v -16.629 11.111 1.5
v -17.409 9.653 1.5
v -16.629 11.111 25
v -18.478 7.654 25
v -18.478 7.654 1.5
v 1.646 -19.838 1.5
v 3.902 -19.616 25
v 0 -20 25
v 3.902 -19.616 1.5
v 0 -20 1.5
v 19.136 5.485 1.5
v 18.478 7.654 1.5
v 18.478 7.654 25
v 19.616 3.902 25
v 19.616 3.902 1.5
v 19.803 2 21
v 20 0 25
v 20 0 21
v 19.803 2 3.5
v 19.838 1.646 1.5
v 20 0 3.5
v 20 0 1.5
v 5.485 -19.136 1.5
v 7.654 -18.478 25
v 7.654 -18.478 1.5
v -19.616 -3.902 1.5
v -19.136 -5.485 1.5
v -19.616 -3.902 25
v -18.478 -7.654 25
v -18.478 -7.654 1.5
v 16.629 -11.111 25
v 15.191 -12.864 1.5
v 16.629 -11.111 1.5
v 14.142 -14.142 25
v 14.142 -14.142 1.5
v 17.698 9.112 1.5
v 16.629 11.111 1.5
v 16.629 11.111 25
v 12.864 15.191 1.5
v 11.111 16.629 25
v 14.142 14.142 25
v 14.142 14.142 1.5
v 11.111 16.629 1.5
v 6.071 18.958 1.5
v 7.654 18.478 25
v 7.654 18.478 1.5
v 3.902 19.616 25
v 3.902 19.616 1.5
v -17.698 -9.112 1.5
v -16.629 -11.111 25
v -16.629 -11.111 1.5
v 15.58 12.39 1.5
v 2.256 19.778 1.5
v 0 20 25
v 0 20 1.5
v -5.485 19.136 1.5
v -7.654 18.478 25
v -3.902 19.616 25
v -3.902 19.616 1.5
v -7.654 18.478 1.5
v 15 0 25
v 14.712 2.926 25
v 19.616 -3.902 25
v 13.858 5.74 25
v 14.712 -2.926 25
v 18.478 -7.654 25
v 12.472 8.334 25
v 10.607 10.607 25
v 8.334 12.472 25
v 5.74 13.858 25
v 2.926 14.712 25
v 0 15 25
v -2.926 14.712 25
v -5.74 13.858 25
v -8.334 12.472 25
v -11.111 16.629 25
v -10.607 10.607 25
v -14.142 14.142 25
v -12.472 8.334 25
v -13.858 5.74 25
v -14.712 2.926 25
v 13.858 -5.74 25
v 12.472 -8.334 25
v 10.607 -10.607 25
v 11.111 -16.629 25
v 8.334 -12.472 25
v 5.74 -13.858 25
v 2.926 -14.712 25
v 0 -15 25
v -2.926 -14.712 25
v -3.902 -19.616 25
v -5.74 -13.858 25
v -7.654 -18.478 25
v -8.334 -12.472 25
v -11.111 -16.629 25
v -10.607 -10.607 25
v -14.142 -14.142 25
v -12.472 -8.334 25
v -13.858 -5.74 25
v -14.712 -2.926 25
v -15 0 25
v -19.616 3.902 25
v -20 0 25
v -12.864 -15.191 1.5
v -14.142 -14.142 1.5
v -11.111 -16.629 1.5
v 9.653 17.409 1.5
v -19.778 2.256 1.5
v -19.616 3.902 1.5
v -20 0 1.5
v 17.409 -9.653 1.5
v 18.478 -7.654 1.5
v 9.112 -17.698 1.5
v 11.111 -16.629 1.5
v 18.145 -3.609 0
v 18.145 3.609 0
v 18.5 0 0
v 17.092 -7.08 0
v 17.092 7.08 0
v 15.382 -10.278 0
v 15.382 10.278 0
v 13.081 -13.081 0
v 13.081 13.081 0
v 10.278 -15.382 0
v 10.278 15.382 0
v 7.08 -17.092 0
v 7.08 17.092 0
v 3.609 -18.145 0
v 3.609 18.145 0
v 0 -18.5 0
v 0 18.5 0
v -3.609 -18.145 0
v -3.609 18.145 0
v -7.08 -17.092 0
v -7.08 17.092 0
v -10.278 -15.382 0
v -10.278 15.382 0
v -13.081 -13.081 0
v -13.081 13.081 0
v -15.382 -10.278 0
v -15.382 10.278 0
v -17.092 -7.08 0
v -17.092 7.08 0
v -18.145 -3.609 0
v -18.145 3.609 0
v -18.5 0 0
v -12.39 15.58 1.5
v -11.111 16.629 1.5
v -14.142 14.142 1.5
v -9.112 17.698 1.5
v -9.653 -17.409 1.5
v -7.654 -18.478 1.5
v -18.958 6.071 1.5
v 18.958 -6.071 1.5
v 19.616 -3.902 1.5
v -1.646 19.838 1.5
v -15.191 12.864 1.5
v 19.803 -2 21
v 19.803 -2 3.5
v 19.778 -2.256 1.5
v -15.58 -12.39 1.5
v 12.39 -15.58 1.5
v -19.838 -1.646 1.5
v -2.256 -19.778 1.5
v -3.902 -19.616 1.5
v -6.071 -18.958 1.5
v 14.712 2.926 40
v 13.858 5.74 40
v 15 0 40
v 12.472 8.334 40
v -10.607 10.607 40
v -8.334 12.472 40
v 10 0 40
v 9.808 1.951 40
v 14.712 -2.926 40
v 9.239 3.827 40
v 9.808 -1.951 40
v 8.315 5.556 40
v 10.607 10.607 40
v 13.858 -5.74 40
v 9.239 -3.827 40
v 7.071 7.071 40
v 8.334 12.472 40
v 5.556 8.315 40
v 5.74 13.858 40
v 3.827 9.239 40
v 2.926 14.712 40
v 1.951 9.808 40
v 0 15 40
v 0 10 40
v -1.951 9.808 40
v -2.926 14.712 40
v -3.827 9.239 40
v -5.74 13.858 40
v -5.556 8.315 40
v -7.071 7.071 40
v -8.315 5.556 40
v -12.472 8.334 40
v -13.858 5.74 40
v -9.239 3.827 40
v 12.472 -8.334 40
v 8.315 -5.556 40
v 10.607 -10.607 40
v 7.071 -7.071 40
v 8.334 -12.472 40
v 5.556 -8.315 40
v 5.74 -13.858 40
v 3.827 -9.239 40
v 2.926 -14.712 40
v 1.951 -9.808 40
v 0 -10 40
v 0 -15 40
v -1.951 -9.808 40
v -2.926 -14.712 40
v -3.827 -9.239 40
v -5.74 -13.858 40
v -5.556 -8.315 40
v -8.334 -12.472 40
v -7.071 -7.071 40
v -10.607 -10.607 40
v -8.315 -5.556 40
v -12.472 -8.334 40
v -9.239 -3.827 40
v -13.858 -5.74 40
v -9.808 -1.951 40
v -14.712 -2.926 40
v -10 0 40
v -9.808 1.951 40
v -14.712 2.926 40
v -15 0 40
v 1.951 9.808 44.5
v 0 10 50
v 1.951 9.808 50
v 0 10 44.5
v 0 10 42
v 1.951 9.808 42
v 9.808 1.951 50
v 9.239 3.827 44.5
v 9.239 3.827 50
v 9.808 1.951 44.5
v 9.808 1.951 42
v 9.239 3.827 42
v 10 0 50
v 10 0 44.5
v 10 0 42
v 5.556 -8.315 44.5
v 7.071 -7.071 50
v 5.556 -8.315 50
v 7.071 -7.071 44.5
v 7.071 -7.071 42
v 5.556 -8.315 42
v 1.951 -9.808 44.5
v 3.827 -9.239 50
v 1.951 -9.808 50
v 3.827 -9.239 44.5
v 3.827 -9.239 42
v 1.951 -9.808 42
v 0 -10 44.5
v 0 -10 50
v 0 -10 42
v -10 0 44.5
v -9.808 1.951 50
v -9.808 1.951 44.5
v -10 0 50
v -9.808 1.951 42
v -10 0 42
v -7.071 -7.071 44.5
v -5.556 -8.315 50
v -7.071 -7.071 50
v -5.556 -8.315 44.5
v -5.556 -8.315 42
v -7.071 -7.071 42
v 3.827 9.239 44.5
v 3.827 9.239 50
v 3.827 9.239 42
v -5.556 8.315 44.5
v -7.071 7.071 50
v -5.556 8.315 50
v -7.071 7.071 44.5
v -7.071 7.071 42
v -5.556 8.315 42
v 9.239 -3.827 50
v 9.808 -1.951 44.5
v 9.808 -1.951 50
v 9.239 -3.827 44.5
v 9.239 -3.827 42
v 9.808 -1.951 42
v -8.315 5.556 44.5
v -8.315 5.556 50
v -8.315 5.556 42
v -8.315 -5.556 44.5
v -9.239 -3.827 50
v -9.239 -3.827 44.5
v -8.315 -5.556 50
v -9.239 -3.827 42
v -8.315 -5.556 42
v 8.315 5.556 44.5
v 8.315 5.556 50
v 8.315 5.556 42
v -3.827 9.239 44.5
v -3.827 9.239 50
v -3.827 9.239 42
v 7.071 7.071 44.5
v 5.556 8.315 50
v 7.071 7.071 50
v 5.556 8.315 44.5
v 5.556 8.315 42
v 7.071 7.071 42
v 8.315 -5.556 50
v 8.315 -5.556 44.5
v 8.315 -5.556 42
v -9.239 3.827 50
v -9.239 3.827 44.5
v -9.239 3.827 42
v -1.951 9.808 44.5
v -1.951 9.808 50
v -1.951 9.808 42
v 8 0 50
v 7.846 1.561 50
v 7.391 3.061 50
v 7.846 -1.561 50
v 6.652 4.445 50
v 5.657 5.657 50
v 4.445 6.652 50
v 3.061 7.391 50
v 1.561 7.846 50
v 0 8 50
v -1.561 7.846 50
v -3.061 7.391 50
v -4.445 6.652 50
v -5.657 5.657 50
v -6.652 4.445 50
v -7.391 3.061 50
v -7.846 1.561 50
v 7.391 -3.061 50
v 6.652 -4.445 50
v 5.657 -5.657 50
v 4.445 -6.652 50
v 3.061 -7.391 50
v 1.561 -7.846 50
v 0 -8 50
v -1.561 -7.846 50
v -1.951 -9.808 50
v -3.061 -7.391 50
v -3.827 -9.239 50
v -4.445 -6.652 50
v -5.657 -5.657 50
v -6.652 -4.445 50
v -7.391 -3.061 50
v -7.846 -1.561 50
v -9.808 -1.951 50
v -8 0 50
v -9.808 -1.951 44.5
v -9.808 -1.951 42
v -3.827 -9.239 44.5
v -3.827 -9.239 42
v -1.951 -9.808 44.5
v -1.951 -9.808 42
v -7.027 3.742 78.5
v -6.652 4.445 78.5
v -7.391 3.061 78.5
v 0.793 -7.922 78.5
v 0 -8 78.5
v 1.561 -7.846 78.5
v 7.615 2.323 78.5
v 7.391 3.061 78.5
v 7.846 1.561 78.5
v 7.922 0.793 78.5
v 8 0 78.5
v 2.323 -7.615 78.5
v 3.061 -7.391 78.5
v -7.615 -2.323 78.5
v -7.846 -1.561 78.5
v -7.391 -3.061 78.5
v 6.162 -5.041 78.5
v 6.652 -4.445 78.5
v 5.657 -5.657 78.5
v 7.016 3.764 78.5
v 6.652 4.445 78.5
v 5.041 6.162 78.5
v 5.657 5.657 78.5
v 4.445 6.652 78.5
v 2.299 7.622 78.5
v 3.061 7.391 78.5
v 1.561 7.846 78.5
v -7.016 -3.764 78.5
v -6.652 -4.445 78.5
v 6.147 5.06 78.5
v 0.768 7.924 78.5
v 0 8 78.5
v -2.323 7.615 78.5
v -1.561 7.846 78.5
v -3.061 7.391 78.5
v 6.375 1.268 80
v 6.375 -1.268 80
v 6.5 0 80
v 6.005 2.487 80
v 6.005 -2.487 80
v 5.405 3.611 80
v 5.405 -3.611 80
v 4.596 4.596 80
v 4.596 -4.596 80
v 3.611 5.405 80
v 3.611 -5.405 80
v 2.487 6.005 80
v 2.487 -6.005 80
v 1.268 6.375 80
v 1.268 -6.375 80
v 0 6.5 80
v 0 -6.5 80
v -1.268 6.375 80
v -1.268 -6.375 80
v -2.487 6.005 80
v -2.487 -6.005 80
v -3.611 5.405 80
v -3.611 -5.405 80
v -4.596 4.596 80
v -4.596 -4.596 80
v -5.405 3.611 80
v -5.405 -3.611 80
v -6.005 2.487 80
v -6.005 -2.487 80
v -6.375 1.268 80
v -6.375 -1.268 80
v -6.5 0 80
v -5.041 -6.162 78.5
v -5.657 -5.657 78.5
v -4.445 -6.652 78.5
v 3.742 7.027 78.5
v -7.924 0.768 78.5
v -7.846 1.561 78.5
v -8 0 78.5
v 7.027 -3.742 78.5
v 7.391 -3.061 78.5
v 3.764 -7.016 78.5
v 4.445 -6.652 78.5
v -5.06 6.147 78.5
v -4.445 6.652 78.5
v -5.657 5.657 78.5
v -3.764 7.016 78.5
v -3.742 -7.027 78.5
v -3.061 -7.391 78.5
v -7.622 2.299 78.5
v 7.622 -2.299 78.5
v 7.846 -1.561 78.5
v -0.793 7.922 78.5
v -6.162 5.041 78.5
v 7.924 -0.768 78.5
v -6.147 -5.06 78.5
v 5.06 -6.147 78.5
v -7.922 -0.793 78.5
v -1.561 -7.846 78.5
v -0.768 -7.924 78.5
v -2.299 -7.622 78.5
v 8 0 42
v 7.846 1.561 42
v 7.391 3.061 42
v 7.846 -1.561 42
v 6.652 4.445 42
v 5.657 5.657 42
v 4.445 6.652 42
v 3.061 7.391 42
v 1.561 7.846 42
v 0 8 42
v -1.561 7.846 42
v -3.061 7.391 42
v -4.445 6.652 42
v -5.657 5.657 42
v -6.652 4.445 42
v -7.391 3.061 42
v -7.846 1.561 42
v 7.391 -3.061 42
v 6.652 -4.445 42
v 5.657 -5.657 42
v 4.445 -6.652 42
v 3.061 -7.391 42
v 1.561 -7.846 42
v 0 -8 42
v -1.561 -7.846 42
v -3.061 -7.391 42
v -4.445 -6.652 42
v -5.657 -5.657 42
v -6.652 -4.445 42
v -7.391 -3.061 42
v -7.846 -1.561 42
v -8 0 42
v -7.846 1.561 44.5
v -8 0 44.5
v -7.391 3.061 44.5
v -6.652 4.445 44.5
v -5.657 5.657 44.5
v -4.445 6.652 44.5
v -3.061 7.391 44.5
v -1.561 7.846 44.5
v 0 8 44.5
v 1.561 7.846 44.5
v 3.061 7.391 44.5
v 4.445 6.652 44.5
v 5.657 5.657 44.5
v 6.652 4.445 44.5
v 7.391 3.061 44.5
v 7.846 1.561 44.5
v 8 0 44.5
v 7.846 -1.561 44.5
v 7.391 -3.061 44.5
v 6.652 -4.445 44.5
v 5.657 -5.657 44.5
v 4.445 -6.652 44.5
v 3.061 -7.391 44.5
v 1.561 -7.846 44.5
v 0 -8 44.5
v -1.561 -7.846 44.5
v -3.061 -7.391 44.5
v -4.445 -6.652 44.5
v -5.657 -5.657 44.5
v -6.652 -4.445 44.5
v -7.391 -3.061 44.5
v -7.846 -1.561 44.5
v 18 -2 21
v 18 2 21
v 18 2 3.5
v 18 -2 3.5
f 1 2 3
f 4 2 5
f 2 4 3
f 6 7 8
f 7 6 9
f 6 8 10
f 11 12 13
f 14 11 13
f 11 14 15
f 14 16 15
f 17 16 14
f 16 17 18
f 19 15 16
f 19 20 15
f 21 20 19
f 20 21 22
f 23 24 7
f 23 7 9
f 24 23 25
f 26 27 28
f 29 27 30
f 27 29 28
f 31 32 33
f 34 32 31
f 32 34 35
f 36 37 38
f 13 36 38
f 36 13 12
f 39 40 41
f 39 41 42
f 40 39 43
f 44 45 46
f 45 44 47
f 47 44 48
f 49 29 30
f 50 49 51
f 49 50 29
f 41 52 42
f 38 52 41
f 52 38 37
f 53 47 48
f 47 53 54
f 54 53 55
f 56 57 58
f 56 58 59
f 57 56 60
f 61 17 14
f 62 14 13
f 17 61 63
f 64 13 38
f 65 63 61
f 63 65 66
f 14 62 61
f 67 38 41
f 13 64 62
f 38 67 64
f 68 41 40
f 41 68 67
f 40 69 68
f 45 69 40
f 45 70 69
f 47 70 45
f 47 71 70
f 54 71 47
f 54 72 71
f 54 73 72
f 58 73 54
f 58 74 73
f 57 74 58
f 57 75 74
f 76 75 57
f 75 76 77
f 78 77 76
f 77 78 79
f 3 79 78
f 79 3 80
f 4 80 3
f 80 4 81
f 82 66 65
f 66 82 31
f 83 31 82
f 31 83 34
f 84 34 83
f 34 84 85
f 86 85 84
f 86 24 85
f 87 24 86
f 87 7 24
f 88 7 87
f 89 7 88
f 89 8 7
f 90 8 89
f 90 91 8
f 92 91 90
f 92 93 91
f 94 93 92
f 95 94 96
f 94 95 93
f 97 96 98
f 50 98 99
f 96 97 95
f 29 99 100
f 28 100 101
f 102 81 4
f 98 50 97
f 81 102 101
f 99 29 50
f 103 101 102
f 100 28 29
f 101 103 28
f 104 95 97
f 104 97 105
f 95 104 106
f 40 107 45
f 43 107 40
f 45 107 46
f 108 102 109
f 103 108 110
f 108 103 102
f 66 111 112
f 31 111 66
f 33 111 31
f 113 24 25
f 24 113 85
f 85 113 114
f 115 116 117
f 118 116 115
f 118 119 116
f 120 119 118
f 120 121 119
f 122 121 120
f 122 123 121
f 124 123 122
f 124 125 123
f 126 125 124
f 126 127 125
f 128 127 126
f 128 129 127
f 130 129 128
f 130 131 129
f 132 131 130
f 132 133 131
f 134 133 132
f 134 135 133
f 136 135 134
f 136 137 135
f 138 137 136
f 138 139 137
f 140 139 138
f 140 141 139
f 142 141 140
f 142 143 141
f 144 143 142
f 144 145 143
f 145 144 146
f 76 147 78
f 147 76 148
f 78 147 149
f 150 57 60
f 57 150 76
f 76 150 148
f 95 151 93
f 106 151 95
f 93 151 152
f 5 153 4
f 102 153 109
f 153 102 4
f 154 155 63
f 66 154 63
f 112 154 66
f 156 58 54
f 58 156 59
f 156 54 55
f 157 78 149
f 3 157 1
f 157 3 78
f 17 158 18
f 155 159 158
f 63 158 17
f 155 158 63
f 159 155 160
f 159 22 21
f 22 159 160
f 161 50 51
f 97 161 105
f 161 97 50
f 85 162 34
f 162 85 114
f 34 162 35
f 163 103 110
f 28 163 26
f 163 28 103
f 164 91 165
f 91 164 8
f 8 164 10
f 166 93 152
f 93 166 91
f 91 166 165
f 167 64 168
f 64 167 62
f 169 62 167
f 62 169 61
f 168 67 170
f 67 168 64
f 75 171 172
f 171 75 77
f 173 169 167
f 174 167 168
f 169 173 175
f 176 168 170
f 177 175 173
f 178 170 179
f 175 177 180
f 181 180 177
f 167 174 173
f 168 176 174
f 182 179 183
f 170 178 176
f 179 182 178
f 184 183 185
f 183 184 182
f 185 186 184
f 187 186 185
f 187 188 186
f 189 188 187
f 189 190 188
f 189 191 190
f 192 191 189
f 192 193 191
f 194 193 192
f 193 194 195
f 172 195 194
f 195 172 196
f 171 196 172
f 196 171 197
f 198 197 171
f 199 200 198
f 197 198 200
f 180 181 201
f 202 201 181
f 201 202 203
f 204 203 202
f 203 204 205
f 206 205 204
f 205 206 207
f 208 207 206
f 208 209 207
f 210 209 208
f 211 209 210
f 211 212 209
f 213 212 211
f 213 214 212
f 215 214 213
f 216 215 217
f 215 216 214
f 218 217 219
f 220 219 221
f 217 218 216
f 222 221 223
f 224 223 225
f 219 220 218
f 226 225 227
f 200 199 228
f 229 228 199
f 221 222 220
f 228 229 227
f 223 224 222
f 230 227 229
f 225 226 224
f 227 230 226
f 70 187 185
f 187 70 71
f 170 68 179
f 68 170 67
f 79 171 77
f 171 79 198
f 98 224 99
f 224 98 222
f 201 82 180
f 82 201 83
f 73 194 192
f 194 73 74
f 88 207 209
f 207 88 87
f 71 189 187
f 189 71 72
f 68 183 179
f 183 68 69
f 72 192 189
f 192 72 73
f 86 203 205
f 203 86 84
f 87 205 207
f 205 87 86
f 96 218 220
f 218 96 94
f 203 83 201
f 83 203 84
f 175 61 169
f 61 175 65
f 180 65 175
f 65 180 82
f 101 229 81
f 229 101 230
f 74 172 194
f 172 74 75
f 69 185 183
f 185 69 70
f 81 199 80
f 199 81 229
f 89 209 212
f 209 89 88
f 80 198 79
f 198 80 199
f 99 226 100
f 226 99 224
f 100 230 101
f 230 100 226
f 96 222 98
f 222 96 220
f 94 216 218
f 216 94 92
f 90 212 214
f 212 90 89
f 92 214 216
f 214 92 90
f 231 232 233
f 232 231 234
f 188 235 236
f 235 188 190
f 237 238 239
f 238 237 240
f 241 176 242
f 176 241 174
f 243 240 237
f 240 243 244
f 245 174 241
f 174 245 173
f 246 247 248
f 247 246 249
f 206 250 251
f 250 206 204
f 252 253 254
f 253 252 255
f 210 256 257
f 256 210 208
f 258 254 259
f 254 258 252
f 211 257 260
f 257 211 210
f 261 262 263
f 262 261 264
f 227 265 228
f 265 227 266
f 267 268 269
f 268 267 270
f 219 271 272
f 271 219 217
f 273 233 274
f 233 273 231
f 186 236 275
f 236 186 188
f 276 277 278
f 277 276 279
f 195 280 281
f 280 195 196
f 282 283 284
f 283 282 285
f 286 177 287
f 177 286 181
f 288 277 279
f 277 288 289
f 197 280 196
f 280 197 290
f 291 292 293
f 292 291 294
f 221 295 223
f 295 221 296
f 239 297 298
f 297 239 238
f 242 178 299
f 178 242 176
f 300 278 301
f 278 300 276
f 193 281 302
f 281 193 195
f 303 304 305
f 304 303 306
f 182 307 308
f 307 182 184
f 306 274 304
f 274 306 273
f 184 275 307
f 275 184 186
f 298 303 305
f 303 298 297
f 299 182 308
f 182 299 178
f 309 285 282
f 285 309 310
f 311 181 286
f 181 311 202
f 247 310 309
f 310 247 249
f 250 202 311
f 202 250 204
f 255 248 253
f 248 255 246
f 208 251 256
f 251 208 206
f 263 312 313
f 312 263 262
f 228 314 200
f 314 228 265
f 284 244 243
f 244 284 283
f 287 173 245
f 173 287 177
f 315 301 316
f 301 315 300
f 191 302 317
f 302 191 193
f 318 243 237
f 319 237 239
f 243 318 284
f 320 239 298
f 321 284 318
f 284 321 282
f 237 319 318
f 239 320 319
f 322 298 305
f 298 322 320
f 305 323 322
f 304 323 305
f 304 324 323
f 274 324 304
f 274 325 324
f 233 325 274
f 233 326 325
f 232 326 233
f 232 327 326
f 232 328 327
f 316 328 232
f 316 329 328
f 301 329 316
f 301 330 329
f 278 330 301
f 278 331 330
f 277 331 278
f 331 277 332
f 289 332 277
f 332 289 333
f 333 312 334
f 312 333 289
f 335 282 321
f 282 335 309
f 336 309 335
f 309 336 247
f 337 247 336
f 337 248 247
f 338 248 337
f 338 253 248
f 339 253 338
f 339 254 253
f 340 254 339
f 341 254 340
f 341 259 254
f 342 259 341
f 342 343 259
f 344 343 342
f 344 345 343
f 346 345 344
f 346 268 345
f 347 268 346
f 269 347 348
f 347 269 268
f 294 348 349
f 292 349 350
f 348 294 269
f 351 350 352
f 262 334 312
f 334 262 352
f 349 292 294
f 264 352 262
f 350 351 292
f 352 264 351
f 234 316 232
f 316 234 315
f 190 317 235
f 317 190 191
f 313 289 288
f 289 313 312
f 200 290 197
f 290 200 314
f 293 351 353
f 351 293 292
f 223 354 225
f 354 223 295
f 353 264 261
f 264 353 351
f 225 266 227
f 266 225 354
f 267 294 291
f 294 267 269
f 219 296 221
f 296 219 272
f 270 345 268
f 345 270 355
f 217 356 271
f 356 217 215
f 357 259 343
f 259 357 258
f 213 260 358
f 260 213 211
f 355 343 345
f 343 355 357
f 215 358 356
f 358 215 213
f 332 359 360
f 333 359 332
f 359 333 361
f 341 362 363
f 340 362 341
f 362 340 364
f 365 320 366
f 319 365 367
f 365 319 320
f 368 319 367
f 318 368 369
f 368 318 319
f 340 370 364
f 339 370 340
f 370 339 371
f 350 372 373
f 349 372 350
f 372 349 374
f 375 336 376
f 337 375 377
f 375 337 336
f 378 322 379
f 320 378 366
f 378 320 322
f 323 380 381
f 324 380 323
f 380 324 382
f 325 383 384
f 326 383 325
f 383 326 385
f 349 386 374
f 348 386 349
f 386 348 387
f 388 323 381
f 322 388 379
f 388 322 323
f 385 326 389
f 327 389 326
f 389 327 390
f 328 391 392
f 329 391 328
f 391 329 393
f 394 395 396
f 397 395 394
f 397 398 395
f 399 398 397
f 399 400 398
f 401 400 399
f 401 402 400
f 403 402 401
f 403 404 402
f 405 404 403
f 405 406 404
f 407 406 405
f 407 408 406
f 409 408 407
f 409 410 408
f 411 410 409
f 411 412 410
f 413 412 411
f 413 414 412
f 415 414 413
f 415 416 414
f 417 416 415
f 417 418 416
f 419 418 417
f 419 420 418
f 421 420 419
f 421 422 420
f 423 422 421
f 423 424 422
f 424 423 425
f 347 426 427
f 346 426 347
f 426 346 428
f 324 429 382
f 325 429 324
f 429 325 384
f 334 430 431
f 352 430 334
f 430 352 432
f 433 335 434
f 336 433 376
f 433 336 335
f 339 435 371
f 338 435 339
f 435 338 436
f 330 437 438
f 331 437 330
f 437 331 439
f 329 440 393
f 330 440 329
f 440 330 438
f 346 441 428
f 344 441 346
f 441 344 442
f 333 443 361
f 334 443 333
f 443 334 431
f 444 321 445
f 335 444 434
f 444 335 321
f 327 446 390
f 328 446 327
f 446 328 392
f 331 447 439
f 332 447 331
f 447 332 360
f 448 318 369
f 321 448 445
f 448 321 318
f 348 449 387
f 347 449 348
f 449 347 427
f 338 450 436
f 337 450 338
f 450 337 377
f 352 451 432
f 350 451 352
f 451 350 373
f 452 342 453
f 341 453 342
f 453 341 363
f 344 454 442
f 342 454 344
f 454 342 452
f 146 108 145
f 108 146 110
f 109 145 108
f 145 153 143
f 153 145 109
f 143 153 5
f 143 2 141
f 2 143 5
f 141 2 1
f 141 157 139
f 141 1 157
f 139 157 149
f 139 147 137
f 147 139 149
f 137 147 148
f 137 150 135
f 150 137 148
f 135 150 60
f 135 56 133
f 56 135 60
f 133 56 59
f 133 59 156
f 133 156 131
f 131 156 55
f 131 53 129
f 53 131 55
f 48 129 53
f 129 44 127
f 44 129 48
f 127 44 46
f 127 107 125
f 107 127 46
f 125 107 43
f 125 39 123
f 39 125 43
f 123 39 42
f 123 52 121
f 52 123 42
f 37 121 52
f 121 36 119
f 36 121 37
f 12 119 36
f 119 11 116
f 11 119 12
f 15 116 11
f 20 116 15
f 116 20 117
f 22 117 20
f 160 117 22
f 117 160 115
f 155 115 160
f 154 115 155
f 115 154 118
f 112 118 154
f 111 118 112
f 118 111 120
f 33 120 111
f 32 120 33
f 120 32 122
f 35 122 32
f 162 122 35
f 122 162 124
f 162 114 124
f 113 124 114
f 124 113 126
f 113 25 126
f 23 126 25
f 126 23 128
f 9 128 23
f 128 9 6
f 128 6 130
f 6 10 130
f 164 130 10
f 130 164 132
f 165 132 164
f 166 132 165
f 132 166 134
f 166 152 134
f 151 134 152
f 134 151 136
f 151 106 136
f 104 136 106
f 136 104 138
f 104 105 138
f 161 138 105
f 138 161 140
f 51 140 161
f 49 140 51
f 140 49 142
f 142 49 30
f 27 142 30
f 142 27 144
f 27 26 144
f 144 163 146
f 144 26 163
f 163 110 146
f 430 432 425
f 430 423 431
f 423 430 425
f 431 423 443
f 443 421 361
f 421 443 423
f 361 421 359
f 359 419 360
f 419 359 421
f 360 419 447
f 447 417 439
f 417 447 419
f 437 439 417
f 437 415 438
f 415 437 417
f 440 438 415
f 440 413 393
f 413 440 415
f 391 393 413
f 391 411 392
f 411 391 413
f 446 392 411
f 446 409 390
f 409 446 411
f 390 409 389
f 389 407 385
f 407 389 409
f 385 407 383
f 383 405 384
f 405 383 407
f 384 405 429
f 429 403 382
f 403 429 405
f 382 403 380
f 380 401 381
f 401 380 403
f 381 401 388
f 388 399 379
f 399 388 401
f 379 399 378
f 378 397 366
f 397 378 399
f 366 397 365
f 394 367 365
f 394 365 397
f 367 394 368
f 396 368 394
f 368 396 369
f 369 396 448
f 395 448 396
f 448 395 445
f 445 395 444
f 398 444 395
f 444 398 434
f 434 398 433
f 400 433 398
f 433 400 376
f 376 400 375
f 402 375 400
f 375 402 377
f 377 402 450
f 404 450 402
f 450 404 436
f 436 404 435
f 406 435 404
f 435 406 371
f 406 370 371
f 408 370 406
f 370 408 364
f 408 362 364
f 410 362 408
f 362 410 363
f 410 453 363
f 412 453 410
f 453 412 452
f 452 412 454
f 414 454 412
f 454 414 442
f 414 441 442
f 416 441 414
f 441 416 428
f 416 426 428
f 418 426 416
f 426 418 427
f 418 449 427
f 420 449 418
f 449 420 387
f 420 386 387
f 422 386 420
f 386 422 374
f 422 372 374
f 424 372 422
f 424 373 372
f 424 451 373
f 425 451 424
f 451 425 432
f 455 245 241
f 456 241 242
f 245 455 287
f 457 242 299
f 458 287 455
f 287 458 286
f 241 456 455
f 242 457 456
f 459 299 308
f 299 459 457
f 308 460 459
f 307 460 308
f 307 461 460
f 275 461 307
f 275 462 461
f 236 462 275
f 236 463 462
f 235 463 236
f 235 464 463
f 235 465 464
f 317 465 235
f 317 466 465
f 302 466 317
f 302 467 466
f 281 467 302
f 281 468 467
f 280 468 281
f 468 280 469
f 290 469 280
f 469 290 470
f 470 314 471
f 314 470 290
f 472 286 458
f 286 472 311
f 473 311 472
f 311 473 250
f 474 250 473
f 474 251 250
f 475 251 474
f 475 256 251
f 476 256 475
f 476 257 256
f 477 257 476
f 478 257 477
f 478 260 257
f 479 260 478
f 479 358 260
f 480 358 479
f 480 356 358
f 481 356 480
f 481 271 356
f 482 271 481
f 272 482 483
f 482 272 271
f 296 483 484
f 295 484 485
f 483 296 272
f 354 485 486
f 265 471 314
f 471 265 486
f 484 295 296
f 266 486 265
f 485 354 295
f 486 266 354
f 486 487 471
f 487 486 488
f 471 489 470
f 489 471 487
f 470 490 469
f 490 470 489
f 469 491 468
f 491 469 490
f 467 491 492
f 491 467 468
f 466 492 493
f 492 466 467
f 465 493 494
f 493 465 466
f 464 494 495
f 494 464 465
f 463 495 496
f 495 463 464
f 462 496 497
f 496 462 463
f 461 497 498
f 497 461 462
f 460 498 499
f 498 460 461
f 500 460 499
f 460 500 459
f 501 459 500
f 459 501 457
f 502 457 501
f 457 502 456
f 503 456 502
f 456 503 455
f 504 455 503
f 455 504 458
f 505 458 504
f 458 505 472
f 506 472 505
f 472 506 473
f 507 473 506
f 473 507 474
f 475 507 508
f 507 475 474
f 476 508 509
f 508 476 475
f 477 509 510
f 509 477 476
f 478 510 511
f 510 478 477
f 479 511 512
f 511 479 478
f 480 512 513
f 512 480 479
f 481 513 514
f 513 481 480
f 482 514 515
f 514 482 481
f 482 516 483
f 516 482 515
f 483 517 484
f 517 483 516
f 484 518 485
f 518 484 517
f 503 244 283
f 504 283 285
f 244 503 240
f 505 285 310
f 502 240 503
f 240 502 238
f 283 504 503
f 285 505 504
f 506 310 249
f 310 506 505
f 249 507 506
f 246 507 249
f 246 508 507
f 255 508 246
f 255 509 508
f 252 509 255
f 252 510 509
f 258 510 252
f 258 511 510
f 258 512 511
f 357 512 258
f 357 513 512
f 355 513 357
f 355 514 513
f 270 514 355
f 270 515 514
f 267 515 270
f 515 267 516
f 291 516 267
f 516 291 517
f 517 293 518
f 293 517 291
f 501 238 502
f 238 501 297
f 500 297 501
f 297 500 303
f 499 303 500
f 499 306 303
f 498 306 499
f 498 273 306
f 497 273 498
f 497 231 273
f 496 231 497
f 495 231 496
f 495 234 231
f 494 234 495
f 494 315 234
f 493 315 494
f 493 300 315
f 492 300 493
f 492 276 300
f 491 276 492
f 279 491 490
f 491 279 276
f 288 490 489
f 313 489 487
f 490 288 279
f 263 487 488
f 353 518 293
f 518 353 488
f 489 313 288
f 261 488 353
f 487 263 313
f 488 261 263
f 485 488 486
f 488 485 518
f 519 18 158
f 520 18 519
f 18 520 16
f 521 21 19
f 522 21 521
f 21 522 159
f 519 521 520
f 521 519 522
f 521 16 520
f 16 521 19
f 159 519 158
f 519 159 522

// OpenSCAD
$fn = 32;

// ----------------------------------------------------------------------
// Stepped shaft: diameters 40, 30, 20, 16 mm, 80 mm long
// ----------------------------------------------------------------------

// --- parameters (mm) ---
d1 = 40;                  // step 1 diameter
len1 = 25;                // step 1 length
d2 = 30;                  // step 2 diameter
len2 = 15;                // step 2 length
d3 = 20;                  // step 3 diameter
len3 = 10;                // step 3 length
d4 = 16;                  // step 4 diameter
len4 = 30;                // step 4 length
total = 80;               // overall length
chamfer = 1.5;            // end chamfer
groove_r = 10;            // groove radius
groove_z = 42;            // groove position from the end
groove_w = 2.5;           // groove width
groove_d = 2;             // groove depth
key_w = 4;                // keyway width
key_d = 2;                // keyway depth
key_len = 17.5;           // keyway length
key_z = 3.5;              // keyway start along the shaft

difference() {
  /* turned body: stacked cylinders, every step sunk into the bigger one */
  union() {
    cylinder(h = len1, d = d1);
    translate([0, 0, 24.6]) cylinder(h = 15.4, d = d2);
    translate([0, 0, 39.6]) cylinder(h = 10.4, d = d3);
    translate([0, 0, 49.6]) cylinder(h = 30.4, d = d4);
  }
  /* bottom chamfer ring cut */
  rotate_extrude() translate([18.5, -2.5]) polygon([[0, 0], [4, 0], [4, 6.5], [0, 2.5]]);
  /* top chamfer ring cut */
  rotate_extrude() translate([6.5, 80]) polygon([[0, 0], [4, -4], [4, 2.5], [0, 2.5]]);
  /* circlip groove just behind the shoulder */
  rotate_extrude() translate([groove_r - groove_d, groove_z]) square([groove_d + 2.5, groove_w]);
  /* keyway milled along the first step */
  translate([d1 / 2 - key_d, -key_w / 2, key_z]) cube([key_d + 2.5, key_w, key_len]);
}
